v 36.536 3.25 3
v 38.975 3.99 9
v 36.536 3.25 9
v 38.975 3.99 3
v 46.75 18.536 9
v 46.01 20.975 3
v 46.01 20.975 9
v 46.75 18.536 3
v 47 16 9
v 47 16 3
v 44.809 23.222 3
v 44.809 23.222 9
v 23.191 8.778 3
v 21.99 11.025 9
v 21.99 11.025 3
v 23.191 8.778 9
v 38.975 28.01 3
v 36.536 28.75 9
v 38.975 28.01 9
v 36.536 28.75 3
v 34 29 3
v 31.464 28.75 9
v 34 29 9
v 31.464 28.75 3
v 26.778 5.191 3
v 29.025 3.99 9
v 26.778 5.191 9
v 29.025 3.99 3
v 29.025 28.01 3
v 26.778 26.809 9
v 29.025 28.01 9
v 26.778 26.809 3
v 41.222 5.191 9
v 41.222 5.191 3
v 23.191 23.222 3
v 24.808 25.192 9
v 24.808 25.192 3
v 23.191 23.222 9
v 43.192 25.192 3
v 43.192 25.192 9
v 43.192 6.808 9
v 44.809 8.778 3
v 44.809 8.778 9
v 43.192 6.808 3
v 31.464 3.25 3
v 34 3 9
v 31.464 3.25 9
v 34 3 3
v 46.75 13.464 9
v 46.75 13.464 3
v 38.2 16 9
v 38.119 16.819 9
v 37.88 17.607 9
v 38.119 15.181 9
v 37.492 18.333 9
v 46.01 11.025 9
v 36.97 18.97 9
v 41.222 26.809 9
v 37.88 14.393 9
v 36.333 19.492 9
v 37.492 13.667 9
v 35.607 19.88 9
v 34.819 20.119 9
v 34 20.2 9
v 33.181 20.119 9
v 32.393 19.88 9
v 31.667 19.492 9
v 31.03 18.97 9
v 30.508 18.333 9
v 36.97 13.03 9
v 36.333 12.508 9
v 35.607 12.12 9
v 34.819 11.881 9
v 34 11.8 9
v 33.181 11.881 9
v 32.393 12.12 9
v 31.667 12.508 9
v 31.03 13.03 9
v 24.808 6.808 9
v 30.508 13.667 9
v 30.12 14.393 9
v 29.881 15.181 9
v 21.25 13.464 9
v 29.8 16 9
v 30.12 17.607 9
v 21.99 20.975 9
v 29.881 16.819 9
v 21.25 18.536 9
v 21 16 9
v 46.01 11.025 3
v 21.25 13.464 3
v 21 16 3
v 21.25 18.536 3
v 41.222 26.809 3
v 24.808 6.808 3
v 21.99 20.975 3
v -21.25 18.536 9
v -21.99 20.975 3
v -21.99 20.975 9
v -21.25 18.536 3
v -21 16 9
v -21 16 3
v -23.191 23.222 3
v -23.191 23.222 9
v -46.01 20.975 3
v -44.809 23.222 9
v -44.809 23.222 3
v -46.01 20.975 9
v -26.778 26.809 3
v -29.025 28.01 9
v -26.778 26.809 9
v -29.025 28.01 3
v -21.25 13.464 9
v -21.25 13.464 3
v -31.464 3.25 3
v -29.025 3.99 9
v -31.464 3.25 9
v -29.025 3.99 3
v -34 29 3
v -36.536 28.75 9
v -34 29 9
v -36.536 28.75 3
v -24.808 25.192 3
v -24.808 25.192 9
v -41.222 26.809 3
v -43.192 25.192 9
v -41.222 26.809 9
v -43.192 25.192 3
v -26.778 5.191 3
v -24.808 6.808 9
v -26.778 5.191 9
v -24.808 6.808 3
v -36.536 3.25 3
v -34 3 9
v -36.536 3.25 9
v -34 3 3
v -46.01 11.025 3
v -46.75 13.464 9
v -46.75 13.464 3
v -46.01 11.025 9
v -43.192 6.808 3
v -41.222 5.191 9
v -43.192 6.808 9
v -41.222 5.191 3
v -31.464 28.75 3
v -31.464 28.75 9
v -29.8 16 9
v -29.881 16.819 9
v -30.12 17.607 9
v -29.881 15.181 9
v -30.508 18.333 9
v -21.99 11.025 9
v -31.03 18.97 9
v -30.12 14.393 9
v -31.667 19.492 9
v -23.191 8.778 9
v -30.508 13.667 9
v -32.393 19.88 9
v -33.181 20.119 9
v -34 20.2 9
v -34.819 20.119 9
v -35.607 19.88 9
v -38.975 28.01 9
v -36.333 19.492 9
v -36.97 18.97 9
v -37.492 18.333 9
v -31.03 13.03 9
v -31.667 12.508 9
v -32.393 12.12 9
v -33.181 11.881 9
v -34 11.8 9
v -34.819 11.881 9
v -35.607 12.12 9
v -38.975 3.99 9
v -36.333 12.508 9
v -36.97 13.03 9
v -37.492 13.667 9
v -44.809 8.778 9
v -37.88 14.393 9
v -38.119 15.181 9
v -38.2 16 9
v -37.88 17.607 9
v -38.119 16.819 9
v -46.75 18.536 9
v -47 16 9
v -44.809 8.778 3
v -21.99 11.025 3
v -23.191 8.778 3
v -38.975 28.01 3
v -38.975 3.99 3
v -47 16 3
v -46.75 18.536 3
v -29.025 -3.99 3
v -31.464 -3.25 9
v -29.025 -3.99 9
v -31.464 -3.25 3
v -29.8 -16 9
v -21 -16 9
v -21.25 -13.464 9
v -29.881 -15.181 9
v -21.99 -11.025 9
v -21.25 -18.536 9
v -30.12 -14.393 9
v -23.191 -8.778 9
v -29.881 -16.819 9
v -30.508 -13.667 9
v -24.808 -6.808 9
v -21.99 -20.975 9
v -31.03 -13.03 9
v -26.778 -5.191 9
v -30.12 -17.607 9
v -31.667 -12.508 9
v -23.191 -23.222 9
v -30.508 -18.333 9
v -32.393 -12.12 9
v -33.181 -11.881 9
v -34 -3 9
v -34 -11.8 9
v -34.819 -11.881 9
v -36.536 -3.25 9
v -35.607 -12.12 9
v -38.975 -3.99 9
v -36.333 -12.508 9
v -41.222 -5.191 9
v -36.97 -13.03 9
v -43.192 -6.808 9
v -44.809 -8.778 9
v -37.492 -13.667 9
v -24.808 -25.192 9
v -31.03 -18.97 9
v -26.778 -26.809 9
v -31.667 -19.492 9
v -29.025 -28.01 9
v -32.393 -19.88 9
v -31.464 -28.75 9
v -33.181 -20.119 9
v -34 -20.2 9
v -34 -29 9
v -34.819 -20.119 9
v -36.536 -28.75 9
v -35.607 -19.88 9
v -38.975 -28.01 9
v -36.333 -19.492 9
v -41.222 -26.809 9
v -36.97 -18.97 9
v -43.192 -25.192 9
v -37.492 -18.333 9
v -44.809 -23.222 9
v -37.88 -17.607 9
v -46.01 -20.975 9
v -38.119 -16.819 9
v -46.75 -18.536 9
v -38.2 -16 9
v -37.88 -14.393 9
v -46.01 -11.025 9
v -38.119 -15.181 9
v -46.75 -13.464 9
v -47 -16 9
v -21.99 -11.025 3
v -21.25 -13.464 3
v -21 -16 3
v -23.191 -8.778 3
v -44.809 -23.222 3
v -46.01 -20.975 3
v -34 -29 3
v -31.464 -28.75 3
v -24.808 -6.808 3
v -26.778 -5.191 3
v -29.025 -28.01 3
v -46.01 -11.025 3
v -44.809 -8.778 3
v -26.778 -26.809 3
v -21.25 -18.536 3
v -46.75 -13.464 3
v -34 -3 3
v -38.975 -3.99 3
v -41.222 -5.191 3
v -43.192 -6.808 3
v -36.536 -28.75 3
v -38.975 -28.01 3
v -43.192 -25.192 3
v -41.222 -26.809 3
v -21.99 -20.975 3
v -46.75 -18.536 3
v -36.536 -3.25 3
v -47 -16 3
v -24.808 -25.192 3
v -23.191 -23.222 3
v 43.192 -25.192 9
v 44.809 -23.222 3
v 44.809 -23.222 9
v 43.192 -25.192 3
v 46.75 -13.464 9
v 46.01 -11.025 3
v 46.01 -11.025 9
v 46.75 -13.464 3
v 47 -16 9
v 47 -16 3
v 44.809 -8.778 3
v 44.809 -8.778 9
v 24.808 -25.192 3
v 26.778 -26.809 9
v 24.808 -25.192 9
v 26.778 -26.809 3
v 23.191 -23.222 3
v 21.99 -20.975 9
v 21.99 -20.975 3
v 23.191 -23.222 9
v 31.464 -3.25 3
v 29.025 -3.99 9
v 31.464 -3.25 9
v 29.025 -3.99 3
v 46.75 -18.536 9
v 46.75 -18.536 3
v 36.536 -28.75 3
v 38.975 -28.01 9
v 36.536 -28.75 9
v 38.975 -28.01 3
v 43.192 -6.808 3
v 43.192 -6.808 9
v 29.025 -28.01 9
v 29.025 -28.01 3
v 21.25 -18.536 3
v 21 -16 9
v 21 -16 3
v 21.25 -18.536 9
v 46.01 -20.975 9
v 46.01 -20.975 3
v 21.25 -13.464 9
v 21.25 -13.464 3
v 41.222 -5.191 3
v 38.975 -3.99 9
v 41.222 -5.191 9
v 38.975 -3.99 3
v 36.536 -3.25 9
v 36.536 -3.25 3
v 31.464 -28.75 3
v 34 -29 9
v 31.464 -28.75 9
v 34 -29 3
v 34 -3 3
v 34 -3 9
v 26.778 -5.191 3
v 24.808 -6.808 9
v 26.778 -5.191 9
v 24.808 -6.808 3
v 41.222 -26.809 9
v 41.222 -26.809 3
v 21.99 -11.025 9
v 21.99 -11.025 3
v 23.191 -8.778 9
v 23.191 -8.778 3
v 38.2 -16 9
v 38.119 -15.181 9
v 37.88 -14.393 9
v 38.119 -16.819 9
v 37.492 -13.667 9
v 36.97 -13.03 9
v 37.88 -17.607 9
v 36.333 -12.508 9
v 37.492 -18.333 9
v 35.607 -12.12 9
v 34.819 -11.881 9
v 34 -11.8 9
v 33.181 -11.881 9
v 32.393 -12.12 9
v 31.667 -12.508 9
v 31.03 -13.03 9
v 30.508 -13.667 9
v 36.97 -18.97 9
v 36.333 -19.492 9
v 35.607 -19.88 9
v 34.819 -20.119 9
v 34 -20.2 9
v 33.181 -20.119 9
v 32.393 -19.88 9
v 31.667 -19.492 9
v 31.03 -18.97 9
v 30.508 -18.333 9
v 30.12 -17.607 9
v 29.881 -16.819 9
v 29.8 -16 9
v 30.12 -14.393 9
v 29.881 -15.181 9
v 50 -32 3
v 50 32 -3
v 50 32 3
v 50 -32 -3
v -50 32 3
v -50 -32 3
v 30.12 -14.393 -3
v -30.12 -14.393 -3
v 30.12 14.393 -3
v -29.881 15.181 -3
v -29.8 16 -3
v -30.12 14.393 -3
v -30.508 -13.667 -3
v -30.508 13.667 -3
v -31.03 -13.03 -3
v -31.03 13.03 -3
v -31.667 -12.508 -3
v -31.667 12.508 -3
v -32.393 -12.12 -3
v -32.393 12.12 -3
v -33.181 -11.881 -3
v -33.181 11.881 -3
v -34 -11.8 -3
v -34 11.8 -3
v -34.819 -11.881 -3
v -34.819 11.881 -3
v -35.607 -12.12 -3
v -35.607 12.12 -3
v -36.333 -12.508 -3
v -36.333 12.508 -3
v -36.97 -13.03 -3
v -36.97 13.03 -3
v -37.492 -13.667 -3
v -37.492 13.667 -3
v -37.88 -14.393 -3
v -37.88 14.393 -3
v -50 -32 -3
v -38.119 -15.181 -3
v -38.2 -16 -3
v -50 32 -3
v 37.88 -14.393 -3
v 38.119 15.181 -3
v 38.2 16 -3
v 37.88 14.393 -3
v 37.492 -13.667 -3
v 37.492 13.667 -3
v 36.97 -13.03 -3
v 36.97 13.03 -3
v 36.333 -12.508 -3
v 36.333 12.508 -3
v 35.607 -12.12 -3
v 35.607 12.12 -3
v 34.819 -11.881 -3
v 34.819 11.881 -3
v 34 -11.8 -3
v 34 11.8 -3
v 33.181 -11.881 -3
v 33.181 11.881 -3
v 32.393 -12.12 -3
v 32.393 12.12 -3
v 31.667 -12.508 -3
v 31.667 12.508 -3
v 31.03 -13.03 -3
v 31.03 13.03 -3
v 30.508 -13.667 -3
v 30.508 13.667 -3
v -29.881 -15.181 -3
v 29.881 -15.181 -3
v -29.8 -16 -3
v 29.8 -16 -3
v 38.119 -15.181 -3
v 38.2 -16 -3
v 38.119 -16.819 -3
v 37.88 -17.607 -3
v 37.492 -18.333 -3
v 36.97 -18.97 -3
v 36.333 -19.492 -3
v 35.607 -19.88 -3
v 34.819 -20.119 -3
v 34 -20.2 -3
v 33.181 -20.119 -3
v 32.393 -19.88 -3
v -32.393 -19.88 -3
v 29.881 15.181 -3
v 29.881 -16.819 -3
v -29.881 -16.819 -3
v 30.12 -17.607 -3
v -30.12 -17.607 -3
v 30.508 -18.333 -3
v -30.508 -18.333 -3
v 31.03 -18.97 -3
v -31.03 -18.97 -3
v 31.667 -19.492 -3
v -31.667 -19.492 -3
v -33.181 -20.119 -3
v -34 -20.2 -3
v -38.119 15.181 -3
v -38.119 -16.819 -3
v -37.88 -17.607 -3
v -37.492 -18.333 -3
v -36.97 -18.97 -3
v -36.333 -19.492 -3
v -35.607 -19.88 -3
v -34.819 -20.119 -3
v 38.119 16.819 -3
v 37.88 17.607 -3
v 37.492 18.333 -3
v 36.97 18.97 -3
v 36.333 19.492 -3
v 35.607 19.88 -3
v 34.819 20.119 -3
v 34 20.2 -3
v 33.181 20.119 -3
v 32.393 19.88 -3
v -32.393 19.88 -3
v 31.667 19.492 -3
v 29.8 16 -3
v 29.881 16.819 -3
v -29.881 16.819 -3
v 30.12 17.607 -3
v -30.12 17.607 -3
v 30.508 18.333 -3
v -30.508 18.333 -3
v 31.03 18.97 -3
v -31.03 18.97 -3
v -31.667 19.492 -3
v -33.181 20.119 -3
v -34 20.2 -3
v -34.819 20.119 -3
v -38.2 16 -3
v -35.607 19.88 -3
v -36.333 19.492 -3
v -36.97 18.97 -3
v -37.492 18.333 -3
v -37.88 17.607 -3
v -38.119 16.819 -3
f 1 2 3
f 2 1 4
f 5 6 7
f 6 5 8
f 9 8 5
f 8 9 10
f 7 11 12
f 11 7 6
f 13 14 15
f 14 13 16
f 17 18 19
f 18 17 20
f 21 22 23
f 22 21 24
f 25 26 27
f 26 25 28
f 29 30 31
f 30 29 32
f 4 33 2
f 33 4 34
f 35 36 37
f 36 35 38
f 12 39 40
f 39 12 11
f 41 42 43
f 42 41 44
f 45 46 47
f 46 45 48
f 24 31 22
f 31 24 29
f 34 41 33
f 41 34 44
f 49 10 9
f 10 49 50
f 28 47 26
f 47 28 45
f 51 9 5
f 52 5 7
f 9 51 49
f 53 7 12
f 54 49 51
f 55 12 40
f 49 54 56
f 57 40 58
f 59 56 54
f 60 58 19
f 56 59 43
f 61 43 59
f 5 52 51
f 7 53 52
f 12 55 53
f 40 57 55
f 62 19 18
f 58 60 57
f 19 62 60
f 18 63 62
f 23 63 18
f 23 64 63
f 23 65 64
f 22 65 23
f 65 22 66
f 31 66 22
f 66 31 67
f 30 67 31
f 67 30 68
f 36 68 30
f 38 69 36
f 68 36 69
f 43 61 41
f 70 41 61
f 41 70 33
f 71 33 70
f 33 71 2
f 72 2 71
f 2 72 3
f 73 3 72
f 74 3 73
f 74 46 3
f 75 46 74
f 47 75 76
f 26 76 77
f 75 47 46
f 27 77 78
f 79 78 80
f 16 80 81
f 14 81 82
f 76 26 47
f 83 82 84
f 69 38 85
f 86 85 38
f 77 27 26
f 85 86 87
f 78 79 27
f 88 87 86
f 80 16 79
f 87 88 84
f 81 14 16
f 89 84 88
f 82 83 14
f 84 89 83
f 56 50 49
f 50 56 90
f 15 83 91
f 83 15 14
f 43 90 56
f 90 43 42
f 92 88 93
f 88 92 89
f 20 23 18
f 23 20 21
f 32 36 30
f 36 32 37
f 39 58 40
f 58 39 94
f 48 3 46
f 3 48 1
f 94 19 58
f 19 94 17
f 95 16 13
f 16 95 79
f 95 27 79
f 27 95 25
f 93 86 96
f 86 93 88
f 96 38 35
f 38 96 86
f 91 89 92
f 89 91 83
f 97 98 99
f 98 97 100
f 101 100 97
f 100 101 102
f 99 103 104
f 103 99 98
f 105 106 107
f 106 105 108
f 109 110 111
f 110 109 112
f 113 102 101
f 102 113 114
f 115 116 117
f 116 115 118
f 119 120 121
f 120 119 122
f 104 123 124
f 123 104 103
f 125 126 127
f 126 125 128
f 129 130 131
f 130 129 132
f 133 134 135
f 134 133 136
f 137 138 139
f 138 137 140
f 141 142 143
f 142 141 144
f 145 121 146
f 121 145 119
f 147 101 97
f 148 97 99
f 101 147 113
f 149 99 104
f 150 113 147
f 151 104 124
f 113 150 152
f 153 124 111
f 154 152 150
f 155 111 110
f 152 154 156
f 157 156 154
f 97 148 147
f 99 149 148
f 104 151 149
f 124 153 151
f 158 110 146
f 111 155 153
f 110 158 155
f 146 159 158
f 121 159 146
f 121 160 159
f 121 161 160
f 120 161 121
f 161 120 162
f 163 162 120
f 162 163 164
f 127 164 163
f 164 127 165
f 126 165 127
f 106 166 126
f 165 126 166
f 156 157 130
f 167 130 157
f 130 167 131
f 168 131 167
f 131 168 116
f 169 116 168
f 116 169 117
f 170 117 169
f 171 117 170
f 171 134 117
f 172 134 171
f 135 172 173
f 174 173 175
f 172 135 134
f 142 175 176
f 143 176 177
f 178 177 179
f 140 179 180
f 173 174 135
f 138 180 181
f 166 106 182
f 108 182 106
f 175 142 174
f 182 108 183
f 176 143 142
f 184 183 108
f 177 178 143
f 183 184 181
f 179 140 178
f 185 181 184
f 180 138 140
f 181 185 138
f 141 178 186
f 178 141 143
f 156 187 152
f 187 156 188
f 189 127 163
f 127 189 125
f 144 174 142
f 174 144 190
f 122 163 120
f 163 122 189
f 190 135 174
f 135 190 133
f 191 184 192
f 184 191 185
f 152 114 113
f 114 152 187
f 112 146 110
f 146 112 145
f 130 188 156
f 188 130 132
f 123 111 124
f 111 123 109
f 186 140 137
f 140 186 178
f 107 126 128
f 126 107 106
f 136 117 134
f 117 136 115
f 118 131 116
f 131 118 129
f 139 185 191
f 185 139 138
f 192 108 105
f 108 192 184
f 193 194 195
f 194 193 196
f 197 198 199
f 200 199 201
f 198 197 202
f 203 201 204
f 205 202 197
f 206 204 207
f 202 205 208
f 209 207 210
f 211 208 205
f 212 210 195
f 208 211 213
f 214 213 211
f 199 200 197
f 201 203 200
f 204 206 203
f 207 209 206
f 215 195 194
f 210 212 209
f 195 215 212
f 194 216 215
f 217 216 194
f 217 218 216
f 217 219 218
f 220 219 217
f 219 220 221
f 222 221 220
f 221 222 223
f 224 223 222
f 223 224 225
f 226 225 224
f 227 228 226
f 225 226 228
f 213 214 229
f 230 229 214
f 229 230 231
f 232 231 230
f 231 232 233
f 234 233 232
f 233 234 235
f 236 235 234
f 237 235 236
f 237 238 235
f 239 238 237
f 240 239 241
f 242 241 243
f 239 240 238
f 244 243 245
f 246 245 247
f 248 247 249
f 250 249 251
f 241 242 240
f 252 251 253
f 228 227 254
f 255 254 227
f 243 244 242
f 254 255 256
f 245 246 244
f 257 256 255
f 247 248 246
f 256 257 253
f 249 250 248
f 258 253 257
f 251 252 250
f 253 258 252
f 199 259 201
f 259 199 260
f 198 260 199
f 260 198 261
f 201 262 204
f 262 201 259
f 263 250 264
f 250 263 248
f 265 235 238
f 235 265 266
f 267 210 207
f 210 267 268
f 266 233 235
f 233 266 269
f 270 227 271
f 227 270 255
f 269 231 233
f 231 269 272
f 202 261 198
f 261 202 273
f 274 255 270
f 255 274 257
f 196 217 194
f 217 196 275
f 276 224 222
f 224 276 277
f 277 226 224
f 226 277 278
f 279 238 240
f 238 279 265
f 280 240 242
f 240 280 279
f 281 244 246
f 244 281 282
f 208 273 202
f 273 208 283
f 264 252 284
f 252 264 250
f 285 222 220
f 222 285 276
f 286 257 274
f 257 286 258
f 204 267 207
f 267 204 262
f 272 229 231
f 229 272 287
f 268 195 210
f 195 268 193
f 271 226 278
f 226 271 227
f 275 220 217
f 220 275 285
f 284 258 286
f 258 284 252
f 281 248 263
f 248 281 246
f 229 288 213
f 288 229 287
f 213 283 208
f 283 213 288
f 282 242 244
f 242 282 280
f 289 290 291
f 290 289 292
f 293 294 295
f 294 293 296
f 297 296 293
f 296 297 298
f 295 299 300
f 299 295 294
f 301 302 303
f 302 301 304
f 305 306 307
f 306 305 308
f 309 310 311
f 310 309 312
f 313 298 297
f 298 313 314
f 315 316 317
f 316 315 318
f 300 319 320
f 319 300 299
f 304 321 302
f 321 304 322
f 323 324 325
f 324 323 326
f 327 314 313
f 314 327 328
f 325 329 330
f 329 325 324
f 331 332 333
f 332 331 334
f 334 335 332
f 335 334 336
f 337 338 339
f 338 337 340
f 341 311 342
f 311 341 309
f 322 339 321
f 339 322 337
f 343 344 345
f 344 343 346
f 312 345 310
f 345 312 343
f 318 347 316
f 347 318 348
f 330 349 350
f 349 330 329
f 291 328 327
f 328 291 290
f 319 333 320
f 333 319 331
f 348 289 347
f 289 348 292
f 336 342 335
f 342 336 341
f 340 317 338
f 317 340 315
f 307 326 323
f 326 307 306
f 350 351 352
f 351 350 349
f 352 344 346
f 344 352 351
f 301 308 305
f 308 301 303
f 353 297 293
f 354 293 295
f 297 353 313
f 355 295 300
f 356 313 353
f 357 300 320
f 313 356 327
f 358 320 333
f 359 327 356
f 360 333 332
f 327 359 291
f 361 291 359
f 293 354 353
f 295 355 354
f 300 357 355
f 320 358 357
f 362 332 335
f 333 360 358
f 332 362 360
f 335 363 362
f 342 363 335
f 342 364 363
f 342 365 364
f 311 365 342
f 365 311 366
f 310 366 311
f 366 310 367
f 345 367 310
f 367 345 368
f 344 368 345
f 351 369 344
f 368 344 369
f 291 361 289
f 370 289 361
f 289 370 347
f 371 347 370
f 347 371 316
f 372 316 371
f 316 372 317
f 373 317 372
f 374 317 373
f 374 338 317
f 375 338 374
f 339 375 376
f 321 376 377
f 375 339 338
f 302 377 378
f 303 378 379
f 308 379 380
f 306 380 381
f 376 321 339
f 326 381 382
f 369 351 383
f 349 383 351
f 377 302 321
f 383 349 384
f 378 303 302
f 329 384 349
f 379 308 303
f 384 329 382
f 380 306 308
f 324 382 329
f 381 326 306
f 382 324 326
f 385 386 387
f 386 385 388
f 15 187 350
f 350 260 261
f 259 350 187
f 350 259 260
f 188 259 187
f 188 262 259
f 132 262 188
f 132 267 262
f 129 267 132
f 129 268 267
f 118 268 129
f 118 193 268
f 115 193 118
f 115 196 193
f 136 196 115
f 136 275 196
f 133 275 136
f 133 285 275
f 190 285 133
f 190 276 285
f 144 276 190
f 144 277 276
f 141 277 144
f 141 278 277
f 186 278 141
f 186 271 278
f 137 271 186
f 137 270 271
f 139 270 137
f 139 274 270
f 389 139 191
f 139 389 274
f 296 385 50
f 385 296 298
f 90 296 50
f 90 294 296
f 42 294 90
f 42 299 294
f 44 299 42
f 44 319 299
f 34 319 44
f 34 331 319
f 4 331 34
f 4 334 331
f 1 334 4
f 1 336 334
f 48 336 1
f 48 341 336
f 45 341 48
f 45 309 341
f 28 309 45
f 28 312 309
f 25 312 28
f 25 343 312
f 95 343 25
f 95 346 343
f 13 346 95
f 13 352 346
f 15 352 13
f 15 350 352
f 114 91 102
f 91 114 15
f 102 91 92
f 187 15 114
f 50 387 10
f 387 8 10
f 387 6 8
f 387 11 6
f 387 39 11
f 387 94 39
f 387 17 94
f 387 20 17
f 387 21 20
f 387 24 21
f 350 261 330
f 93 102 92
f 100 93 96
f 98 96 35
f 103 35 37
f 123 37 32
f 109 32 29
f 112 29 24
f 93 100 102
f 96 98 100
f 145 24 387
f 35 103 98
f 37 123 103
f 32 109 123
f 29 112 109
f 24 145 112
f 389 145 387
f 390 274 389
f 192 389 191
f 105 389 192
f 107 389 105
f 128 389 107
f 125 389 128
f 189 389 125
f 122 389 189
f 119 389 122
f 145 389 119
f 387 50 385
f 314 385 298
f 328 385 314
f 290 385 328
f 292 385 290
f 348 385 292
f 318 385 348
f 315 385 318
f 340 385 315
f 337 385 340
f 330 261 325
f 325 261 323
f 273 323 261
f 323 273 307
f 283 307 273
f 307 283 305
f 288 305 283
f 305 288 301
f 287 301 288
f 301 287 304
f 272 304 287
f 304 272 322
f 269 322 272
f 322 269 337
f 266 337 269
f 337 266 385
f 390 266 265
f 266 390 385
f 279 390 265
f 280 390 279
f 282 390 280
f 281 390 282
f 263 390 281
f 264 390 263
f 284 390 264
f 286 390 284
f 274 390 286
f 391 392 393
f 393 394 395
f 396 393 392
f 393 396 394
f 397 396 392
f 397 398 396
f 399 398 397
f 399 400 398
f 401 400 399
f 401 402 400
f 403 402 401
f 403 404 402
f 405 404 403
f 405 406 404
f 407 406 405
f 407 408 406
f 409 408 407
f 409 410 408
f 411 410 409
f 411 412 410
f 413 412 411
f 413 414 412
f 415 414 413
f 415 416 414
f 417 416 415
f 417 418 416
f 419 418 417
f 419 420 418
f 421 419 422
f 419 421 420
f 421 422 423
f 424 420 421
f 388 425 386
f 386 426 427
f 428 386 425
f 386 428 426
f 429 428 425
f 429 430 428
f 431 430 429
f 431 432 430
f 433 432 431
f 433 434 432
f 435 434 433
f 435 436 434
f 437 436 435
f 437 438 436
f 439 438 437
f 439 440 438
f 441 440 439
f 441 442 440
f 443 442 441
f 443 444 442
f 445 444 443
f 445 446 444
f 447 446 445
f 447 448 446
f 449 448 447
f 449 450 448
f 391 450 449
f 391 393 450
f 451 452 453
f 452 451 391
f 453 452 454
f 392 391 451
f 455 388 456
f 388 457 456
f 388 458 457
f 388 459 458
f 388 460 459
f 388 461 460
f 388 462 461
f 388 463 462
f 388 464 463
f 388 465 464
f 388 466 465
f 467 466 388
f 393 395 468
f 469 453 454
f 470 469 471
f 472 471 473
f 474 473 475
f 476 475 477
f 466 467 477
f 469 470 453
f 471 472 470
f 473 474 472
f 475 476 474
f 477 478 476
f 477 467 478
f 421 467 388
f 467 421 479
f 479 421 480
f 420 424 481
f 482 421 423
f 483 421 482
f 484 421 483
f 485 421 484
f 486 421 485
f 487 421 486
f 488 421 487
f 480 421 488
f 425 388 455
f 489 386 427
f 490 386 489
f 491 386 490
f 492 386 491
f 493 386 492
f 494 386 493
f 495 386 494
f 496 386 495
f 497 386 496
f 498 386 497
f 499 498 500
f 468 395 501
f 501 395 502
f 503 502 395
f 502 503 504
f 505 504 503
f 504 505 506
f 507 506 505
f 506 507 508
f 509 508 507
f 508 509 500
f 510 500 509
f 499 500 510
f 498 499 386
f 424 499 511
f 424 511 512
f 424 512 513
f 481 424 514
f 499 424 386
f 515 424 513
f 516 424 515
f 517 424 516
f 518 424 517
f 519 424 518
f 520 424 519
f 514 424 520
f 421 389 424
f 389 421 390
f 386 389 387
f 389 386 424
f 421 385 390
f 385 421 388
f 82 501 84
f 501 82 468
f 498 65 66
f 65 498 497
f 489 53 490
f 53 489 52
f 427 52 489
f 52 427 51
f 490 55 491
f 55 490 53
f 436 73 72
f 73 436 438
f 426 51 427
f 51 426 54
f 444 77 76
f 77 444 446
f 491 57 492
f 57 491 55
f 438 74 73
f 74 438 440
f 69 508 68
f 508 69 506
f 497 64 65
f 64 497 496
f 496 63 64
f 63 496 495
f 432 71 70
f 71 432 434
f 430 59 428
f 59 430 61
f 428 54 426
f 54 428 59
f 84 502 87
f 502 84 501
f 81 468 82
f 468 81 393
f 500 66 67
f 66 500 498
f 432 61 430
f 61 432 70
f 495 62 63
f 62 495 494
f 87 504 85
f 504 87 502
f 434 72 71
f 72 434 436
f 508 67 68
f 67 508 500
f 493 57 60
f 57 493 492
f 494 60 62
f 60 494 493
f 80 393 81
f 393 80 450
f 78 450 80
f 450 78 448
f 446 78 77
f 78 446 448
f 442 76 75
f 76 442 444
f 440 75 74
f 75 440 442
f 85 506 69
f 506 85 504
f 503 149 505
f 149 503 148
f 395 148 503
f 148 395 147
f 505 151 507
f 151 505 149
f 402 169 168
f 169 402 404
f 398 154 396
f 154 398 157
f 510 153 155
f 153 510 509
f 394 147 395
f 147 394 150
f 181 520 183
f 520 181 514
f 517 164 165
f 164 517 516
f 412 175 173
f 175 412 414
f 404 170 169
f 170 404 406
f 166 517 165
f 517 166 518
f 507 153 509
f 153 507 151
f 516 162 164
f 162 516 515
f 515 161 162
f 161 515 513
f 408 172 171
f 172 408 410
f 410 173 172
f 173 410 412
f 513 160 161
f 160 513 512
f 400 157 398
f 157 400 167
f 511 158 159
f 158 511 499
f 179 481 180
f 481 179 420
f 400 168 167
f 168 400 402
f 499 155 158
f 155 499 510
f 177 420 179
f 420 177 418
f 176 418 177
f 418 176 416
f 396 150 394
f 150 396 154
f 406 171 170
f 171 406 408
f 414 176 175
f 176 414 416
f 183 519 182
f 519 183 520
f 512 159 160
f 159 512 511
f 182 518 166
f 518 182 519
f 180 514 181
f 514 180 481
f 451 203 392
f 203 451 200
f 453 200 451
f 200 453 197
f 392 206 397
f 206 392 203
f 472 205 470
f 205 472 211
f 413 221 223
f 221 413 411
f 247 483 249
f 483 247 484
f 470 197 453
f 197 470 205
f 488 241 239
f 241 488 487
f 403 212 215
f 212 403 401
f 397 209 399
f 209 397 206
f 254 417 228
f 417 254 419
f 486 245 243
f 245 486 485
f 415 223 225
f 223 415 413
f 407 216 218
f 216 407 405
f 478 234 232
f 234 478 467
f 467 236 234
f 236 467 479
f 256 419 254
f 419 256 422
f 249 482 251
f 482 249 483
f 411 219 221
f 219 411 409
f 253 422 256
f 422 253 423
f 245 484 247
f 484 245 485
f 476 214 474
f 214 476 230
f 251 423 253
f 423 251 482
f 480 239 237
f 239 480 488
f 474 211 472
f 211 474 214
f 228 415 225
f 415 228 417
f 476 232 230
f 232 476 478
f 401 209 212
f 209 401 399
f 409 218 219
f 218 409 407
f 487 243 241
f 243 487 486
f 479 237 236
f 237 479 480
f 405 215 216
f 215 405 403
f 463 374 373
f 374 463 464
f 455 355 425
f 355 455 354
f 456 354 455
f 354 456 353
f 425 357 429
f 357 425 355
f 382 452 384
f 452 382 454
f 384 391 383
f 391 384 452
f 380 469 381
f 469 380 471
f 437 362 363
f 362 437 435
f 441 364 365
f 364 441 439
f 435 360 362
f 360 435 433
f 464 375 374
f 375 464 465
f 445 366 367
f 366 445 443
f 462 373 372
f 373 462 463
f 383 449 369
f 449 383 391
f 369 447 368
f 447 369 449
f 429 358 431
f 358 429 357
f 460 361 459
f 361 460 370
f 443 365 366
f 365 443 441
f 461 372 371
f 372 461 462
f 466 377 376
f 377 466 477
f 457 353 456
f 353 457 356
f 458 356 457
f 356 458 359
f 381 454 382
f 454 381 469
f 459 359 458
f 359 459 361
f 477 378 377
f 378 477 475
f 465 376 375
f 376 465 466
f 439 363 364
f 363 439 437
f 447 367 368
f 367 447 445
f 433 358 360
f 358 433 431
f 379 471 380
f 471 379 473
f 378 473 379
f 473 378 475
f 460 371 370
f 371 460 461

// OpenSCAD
$fn = 32;

// ----------------------------------------------------------------------
// Anchor pads 100 x 64 x 12
// four corner bosses with anchor holes
// ----------------------------------------------------------------------

// --- parameters (mm) ---
plate = [100, 64, 6];  // base plate size (x, y, z)
pads = 4;              // boss count, one per corner
edge = 16;             // boss centre offset from the plate edge
boss_d = 26;           // boss diameter
boss_h = 6;            // boss height above the base plate
hole_d = 8.4;          // hole diameter

// --- derived feature positions (mm) ---
height = plate[2] + boss_h;      // = 12   overall height of the part
corner_x = plate[0] / 2 - edge;  // = 34   boss centre X
corner_y = plate[1] / 2 - edge;  // = 16   boss centre Y
feature_centers = [
  [corner_x, corner_y],
  [-corner_x, corner_y],
  [-corner_x, -corner_y],
  [corner_x, -corner_y]
];   // boss centres, anchor holes are drilled there

// base plate, four bosses standing on it, anchor holes all the way through
difference() {
  union() {
    cube(plate, center = true);
    for (centre = feature_centers)
      translate([centre[0], centre[1], plate[2] / 2 - 1])
        cylinder(d = boss_d, h = boss_h + 1);
  }
  for (centre = feature_centers)
    translate([centre[0], centre[1], -height])
      cylinder(d = hole_d, h = 2 * height + 2);  // through boss and plate
}
